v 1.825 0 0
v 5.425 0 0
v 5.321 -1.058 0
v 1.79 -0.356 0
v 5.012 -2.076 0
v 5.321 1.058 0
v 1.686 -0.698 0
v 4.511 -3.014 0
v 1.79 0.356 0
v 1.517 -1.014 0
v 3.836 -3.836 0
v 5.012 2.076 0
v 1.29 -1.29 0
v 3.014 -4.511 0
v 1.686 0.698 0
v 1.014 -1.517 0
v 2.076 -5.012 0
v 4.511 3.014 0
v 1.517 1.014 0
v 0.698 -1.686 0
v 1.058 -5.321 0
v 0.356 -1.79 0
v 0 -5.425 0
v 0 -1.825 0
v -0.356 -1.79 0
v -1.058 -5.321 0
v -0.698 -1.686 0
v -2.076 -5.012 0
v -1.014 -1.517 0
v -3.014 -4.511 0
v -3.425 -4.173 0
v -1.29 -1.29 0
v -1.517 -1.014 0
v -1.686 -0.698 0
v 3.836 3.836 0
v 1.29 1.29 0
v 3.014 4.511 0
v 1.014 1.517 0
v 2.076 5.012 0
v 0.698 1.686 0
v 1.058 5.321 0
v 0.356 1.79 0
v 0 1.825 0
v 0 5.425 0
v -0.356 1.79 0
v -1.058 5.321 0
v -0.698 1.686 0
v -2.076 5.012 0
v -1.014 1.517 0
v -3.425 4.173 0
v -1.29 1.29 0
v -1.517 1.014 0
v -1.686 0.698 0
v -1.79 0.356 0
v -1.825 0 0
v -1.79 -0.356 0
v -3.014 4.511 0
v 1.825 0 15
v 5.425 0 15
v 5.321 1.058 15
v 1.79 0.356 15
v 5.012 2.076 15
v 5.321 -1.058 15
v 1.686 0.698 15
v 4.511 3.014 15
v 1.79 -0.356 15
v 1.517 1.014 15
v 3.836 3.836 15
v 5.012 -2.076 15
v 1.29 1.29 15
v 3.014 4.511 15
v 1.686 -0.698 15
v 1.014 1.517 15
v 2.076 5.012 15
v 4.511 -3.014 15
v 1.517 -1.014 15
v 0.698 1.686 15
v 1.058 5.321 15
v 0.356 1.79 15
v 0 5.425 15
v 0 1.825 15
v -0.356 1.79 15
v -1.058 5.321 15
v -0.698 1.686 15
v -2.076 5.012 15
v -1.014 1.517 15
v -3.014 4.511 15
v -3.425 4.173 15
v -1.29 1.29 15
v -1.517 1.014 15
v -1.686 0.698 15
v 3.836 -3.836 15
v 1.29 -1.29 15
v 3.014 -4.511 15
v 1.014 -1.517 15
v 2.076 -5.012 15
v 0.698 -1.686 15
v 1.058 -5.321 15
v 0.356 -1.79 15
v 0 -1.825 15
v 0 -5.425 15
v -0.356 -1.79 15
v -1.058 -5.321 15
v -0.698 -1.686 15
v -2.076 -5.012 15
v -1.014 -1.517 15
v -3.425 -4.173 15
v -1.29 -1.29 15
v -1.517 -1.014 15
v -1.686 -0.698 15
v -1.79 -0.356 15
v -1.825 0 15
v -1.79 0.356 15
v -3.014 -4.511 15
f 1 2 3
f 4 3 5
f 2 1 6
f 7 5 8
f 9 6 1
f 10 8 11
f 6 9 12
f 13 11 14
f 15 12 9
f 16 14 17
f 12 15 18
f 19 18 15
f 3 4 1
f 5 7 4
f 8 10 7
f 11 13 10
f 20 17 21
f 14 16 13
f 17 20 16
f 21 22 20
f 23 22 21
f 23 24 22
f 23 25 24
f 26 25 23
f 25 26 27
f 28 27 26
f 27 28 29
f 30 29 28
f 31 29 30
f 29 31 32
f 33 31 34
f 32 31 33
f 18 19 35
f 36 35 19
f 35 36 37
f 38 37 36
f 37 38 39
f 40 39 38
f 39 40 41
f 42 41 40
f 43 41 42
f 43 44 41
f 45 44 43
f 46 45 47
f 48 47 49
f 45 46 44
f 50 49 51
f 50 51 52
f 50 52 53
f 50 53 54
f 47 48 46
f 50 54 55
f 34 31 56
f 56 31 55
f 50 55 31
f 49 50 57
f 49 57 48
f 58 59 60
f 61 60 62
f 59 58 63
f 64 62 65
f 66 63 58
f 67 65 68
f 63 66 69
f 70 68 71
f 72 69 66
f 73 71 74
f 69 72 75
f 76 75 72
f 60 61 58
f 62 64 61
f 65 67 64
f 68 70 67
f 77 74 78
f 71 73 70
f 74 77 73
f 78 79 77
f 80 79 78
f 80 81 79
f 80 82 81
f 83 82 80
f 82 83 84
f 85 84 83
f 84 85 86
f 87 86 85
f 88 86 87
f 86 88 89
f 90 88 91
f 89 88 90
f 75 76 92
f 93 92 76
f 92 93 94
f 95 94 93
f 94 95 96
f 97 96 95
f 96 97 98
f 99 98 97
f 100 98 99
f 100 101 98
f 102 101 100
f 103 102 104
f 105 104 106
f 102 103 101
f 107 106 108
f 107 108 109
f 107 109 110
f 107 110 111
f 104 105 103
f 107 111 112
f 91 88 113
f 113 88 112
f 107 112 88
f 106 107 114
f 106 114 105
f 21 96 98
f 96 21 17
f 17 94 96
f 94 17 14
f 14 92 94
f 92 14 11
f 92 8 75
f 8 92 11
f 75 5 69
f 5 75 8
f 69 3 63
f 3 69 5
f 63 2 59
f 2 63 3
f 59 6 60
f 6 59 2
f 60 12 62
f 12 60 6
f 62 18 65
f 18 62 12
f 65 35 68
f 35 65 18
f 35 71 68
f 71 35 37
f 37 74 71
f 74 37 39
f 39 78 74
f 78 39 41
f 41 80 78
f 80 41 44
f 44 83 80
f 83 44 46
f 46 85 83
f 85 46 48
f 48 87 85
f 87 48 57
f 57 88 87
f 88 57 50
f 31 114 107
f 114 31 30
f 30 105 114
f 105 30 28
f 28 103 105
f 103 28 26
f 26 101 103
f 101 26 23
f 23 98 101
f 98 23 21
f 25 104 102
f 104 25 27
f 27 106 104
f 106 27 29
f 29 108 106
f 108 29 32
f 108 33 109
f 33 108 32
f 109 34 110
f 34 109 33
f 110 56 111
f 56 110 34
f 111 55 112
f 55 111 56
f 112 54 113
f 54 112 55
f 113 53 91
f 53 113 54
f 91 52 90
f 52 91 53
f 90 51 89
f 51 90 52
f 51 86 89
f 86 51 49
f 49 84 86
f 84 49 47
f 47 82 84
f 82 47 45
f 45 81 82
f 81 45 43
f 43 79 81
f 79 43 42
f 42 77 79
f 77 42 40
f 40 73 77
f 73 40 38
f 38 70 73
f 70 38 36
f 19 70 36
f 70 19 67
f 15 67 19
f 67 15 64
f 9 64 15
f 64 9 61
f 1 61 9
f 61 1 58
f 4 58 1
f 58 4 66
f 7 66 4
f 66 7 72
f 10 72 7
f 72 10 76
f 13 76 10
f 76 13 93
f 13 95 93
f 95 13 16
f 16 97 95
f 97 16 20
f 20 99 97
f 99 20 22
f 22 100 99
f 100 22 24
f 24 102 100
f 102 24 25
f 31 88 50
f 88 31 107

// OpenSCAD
// Wobbly outlet spacer post

$fn = 32;

outlet_screw_dia = 3.65;
post_dia = outlet_screw_dia + 3.6*2;
post_h = 15.0;

intersection() {
    linear_extrude(post_h)
    difference() {
        circle(d=post_dia);
        circle(d=outlet_screw_dia);
    }
    translate([1,0,post_h/2])
    cube([post_dia-2, post_dia, post_h], center=true);
}
